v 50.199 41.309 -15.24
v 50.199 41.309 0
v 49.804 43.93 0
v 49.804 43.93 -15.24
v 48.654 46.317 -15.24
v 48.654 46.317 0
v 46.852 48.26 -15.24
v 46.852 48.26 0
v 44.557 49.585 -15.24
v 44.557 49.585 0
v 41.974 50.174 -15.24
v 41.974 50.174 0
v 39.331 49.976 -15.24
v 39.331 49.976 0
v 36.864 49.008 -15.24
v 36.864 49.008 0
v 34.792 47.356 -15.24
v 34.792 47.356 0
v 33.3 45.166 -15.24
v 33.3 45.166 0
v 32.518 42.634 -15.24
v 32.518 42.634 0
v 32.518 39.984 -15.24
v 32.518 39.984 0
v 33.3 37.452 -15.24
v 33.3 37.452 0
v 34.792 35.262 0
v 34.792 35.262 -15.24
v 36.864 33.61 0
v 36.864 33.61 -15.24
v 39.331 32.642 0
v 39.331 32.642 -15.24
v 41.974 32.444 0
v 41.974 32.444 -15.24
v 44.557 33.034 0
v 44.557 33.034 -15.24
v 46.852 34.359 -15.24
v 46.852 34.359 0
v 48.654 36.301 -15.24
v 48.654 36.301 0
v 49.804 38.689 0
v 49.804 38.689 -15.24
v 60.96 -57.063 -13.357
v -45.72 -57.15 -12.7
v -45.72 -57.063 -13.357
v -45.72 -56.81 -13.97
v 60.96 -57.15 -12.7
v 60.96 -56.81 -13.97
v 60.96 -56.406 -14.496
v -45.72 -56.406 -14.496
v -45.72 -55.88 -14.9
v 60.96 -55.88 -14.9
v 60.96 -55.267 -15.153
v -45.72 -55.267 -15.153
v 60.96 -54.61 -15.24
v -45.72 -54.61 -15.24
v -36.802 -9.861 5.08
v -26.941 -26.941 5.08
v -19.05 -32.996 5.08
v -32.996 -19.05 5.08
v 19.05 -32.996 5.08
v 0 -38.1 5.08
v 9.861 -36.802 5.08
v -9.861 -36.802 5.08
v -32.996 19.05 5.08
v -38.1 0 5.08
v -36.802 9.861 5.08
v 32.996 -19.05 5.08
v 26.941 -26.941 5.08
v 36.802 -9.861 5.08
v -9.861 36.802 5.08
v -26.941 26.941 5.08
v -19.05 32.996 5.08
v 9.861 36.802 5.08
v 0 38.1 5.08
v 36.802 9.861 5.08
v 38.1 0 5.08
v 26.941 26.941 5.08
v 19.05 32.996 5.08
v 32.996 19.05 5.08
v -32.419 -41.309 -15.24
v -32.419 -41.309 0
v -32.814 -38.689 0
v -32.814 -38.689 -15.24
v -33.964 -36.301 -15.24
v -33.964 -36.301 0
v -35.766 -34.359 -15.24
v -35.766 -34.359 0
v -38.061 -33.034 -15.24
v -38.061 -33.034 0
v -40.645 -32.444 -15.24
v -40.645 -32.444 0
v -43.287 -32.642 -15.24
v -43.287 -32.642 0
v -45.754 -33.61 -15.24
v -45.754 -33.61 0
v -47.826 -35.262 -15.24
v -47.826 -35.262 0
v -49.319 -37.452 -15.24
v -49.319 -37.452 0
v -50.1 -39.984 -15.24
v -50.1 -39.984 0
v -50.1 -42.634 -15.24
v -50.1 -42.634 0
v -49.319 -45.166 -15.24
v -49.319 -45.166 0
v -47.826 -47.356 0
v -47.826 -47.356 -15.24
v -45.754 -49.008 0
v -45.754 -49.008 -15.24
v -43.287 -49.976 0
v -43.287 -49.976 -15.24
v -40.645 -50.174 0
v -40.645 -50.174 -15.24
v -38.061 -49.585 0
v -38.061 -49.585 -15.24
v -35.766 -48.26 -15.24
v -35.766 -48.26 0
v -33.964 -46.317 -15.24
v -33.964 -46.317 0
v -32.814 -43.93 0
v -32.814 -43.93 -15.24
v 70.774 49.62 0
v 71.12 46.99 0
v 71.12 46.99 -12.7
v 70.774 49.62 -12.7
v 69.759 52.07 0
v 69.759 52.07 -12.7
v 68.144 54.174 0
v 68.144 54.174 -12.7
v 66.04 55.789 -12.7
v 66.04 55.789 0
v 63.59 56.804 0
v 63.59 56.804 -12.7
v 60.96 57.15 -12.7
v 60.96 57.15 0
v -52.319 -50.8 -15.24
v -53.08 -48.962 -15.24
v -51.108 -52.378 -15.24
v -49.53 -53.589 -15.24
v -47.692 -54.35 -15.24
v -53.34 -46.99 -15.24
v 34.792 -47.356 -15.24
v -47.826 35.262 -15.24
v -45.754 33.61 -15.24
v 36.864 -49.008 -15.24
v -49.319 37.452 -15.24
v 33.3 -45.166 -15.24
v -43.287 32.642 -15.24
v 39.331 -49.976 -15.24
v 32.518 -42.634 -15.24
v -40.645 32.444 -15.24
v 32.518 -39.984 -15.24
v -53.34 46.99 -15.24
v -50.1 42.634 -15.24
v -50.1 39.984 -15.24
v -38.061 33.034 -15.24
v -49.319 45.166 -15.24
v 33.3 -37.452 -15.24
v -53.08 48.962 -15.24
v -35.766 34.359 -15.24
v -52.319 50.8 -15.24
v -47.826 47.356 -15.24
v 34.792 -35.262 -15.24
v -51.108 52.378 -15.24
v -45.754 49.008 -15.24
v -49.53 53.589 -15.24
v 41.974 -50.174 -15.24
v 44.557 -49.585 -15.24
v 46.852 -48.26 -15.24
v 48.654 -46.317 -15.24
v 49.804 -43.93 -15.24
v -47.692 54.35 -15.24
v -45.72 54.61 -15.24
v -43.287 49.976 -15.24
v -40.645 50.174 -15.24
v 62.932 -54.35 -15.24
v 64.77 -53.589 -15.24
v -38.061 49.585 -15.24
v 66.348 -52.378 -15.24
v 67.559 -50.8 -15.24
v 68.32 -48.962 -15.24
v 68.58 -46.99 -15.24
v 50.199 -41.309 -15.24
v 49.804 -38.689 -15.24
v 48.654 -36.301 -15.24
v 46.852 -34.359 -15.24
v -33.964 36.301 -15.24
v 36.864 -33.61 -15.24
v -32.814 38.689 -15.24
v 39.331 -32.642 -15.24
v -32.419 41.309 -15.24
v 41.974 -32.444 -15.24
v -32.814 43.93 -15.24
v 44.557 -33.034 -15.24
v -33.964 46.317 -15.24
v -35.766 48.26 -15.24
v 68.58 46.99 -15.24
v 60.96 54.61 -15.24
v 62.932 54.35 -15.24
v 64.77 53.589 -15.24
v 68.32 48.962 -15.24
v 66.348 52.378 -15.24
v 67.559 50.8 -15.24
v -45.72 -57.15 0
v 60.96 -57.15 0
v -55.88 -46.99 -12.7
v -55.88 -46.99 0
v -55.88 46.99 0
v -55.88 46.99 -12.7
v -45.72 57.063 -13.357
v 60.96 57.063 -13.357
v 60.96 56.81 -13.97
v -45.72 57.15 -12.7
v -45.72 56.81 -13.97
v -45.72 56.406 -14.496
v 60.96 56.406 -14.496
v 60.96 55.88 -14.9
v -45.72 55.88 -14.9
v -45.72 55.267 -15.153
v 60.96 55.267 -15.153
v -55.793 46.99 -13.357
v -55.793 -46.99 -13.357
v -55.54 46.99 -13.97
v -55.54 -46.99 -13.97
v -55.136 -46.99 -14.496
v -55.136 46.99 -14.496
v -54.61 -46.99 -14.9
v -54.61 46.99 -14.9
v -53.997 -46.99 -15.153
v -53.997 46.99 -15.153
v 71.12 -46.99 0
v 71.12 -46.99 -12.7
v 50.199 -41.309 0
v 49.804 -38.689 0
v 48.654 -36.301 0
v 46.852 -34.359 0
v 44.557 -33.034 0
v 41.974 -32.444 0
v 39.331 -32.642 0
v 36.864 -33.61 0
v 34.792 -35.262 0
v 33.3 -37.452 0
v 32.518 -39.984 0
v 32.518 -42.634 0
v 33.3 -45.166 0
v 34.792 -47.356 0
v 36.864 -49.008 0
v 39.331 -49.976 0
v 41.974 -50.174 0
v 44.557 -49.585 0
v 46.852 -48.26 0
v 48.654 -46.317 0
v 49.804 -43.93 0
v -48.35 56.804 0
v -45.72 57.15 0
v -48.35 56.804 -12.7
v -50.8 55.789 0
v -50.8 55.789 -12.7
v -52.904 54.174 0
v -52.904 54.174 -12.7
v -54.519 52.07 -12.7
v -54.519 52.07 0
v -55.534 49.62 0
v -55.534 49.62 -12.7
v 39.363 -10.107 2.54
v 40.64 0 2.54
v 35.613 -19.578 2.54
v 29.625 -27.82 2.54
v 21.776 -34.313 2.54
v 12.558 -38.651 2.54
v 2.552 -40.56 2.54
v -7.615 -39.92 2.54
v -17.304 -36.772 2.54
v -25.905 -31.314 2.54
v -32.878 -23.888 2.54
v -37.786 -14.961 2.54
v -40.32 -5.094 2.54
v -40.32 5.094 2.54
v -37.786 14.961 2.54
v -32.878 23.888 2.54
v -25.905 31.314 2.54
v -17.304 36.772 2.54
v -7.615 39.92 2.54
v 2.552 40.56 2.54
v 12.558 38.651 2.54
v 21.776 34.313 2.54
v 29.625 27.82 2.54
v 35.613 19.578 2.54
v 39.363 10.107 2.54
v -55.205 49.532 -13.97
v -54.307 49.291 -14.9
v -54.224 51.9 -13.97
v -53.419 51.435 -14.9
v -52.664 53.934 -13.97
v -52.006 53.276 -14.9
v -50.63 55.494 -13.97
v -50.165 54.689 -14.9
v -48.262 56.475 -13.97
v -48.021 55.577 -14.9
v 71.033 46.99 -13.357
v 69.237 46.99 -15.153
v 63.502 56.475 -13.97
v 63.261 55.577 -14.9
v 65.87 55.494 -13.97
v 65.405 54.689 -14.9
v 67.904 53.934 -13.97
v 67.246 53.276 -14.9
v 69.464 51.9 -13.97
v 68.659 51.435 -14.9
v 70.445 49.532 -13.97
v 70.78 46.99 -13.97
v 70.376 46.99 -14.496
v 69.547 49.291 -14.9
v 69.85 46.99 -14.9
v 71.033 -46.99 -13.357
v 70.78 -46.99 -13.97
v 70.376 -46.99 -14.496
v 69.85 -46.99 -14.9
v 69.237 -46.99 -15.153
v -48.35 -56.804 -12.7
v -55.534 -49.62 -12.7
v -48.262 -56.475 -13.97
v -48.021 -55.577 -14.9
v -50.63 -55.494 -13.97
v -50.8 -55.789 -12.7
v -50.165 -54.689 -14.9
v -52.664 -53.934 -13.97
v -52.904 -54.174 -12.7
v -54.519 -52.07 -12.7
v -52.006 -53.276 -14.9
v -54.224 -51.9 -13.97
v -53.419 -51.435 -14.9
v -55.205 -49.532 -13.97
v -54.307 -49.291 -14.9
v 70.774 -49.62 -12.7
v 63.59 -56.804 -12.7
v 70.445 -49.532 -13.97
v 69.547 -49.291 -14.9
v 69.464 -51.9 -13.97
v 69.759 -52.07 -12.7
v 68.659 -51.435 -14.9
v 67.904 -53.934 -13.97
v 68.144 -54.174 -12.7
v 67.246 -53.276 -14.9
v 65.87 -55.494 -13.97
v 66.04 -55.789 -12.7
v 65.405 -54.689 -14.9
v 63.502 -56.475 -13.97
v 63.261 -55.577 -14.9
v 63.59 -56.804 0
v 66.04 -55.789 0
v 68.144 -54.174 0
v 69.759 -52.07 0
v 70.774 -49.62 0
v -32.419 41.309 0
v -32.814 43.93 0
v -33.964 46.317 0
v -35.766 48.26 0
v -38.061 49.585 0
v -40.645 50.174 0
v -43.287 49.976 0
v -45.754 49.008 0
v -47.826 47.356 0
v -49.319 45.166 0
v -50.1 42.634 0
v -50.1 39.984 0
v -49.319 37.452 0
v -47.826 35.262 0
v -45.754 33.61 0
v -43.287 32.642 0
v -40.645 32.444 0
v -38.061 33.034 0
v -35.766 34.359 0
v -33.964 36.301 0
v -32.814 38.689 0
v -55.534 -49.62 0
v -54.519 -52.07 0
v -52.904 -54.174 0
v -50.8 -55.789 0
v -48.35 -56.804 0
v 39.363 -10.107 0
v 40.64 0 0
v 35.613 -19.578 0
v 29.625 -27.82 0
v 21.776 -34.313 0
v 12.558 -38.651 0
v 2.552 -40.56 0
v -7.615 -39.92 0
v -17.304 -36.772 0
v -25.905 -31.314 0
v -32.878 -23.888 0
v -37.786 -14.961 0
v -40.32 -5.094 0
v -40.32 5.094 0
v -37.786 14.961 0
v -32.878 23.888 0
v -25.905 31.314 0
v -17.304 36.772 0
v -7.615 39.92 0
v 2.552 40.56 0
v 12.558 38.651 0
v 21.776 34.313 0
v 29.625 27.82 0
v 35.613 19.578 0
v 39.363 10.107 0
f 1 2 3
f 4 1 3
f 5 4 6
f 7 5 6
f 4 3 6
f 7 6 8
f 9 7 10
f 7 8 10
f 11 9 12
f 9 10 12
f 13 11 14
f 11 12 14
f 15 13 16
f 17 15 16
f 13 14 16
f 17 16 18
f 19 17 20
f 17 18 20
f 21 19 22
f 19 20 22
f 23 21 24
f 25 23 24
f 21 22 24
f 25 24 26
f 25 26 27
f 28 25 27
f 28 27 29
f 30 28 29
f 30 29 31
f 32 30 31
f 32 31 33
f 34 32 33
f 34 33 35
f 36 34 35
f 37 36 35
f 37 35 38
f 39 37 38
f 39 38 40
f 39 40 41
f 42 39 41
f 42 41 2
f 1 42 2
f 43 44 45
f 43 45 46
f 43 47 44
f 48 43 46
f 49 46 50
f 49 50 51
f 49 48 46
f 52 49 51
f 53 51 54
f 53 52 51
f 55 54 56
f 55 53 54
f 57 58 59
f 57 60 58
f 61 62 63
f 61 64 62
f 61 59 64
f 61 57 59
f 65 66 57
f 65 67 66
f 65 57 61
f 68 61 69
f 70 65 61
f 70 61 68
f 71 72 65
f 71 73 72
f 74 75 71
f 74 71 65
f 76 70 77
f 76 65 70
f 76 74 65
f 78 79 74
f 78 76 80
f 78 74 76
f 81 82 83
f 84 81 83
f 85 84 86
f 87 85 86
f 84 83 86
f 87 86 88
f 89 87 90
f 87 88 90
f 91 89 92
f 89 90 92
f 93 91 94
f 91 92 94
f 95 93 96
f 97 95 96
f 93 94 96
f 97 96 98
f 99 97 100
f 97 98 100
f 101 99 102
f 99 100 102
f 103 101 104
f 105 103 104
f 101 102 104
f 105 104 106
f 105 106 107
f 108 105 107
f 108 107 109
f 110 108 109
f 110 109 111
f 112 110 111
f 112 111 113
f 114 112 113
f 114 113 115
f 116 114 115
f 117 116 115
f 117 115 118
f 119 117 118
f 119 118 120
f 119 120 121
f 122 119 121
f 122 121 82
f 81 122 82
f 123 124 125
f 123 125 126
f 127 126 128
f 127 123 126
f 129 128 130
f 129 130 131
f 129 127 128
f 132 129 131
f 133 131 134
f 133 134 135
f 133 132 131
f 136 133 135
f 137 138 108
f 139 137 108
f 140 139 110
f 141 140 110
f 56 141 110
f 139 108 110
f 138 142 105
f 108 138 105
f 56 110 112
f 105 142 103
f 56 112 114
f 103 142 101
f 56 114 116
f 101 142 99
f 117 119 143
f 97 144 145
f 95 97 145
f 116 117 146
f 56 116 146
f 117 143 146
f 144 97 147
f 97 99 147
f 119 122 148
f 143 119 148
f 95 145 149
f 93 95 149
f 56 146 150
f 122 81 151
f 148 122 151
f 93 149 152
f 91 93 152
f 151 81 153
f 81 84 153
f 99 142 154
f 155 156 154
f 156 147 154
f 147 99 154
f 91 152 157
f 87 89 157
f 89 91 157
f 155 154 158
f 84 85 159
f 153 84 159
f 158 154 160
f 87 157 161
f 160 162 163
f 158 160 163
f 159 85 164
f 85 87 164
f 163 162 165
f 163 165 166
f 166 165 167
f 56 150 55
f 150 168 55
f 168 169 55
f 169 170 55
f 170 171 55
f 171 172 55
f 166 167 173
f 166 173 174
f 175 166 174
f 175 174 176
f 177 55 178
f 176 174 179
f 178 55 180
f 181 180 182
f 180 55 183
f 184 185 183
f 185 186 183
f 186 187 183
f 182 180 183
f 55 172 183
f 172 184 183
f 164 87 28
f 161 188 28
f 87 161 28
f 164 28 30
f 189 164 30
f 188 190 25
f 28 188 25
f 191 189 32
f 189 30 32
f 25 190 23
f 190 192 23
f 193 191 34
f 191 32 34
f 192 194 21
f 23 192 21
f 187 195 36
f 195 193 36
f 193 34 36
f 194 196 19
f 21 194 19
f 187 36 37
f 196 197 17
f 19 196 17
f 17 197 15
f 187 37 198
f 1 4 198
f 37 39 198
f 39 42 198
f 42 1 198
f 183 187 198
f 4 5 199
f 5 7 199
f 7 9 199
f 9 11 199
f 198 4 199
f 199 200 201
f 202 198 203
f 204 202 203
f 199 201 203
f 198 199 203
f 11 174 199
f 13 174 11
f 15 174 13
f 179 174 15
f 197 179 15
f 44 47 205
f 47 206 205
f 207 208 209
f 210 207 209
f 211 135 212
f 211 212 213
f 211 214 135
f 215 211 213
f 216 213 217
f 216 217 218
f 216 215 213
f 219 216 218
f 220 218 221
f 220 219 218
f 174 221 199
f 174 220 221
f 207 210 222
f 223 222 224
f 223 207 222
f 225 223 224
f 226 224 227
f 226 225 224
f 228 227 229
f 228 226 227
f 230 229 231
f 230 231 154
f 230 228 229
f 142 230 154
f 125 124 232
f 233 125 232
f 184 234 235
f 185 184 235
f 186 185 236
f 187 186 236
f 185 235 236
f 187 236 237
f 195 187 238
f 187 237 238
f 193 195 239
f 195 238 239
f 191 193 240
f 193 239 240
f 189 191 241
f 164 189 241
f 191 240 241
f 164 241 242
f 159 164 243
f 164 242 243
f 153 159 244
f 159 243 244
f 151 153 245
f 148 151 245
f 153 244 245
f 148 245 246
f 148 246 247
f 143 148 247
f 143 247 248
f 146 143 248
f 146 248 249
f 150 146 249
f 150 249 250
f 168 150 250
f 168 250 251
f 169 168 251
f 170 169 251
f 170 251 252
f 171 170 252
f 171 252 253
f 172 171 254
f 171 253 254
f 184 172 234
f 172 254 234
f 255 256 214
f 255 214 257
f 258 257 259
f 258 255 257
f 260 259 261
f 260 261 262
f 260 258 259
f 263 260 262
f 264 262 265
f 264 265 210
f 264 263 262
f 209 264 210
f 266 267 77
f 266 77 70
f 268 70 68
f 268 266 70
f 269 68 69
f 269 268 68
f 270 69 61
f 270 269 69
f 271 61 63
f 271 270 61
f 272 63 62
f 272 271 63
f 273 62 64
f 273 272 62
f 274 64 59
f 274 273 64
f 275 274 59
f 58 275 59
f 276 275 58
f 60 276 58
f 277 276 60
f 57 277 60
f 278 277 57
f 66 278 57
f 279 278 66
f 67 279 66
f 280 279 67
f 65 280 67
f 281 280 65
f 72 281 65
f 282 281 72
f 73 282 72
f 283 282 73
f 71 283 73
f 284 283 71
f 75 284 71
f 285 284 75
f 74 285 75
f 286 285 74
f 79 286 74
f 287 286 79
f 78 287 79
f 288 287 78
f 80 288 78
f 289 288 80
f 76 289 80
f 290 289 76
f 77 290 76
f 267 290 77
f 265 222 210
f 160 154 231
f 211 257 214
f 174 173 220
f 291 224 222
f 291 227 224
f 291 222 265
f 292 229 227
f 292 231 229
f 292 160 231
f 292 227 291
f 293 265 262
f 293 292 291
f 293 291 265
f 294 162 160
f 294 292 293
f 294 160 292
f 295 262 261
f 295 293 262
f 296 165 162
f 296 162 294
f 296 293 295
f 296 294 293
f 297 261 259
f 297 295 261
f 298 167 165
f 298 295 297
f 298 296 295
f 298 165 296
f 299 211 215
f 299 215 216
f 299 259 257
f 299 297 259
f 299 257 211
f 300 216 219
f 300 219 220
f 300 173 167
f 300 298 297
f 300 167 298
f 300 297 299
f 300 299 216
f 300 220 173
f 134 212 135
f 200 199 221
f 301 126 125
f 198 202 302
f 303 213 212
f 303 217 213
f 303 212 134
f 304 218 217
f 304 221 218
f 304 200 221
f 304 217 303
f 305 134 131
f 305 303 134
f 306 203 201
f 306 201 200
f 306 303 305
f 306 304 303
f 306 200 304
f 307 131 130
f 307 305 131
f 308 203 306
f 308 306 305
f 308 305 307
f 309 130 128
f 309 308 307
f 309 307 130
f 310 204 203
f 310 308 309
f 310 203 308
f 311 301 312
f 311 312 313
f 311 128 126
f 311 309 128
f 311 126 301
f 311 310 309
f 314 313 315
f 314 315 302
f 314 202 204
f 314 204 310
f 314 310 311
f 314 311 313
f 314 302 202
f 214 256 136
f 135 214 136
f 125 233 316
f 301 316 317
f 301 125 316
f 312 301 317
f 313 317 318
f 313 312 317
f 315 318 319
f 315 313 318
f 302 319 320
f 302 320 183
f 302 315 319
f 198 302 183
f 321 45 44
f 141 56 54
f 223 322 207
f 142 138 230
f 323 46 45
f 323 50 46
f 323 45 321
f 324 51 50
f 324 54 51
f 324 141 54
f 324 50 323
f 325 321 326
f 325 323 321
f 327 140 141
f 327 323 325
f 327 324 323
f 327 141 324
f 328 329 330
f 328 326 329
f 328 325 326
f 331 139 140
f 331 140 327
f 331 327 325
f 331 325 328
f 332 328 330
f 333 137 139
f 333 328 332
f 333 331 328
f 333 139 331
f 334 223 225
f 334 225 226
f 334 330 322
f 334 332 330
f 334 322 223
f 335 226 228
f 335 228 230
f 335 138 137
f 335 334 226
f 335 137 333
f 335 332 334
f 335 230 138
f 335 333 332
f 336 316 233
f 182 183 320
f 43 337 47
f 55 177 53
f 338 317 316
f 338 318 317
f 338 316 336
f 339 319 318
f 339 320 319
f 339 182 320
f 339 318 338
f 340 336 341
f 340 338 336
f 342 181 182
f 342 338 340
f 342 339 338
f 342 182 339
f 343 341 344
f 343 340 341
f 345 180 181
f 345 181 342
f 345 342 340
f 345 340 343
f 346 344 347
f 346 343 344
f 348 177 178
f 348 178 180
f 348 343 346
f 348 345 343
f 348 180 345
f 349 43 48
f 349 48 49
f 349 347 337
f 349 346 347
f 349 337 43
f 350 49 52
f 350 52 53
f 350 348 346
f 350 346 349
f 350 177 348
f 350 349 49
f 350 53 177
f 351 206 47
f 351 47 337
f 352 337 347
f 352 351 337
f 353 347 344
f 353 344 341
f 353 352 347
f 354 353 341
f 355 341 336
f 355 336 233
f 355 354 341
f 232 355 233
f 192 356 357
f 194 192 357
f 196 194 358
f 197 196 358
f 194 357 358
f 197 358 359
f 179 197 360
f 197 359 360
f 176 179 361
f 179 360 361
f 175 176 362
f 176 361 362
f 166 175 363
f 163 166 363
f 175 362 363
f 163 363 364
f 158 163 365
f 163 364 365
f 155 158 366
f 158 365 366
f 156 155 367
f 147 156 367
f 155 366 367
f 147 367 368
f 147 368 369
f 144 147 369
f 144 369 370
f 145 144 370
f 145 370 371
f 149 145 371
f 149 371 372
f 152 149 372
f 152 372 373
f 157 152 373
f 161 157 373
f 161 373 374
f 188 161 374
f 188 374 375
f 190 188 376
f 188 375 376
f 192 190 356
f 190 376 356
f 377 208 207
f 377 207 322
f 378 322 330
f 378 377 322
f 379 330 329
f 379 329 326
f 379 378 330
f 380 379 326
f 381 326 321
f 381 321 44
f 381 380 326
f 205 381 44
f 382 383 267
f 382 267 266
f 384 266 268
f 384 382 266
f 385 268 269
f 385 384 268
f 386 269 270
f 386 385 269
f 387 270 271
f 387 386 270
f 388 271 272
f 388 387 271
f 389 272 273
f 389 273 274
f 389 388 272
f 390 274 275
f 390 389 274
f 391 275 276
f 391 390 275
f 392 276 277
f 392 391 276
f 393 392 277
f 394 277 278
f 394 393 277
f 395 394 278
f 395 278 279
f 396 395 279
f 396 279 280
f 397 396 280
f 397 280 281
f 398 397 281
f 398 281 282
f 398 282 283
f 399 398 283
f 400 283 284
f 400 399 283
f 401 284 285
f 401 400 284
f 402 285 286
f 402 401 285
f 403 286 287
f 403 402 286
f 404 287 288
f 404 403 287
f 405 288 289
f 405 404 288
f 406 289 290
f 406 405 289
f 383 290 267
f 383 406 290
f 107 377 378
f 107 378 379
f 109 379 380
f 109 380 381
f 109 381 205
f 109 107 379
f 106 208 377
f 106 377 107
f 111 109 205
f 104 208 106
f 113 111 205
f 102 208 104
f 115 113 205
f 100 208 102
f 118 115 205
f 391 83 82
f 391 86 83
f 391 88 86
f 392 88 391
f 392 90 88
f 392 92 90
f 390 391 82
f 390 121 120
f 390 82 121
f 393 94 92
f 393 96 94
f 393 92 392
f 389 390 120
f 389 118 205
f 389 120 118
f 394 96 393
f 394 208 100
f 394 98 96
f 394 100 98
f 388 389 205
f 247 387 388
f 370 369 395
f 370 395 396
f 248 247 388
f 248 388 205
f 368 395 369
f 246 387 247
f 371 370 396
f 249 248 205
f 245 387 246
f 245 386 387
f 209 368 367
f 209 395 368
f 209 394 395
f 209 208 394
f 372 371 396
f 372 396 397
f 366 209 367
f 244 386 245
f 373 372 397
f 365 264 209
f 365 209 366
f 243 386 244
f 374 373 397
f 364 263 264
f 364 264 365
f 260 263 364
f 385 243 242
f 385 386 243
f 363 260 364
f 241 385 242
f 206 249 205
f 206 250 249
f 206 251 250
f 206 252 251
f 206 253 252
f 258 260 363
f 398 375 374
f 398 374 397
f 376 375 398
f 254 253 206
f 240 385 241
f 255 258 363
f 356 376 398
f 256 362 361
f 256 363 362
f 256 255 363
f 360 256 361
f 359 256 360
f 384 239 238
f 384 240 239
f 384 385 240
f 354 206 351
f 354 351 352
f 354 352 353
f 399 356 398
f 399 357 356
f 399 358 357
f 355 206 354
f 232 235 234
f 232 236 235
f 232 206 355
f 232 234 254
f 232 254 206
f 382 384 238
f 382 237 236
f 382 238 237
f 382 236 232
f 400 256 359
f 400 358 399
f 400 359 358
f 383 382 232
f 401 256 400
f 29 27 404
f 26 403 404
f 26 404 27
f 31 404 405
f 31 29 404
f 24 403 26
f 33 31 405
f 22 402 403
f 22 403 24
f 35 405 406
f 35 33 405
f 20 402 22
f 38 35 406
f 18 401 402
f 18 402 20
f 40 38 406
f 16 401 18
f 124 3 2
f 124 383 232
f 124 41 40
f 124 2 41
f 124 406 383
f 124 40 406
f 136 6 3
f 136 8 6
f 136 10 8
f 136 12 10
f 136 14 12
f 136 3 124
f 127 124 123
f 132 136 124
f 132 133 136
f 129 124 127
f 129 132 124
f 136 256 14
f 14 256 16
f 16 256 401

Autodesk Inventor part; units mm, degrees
ref_plane "YZ Plane" through (0, 0, 0) normal (1, 0, 0) x (0, 1, 0)
ref_plane "XZ Plane" through (0, 0, 0) normal (0, 1, 0) x (-1, 0, 0)
ref_plane "XY Plane" through (0, 0, 0) normal (0, 0, 1) x (1, 0, 0)
sketch "Sketch1" plane through (0, 0, 0) normal (0, 0, 1) x (1, 0, 0)
  line L0 (-45.72, 57.15) -> (60.96, 57.15)
  line L1 (71.12, 46.99) -> (71.12, -46.99)
  line L2 (60.96, -57.15) -> (-45.72, -57.15)
  line L3 (-55.88, -46.99) -> (-55.88, 46.99)
  line L4 (-85.7425, 0) -> (99.7187, 0) projected
  line L5 (0, -82.9559) -> (0, 82.9559) projected
  circle A0 centre (0, 0) radius 40.64
  circle A1 centre (0, 0) radius 58.42 construction
  line L6 (0, 0) -> (-59.2481, 59.2481) construction
  circle A2 centre (-41.3092, 41.3092) radius 8.89
  circle A3 centre (-41.3092, -41.3092) radius 8.89
  circle A4 centre (41.3092, -41.3092) radius 8.89
  circle A5 centre (41.3092, 41.3092) radius 8.89
  arc A6 (-45.72, 57.15) -> (-55.88, 46.99) centre (-45.72, 46.99) ccw
  arc A7 (71.12, 46.99) -> (60.96, 57.15) centre (60.96, 46.99) ccw
  arc A8 (60.96, -57.15) -> (71.12, -46.99) centre (60.96, -46.99) ccw
  arc A9 (-55.88, -46.99) -> (-45.72, -57.15) centre (-45.72, -46.99) ccw
  point P0 (71.12, -57.15)
  point P1 (71.12, 57.15)
  point P2 (-55.88, -57.15)
  point P3 (71.12, 0)
  dimension "d4" = 116.84
  dimension "d0" = 127
  dimension "d1" = 114.3
  dimension "d2" = 55.88
  dimension "d3" = 81.28
  dimension "d5" = 45
  dimension "d6" = 17.78
  dimension "d9" = 360
  dimension "d11" = 10.16
  dimension "d12" = 59.2481
extrude "Extrusion1" add sketch "Sketch1" against normal blind 15.24
extrude "Extrusion2" add sketch "Sketch1" along normal blind 5.08 contours A0 L4 L5 | L5 L4 A0 | L5 A0 L4 | L4 A0 L5
chamfer "Chamfer1" distance 2.54 angle 45 1 edges at (-40.64, 0, 5.08) measured on face at (4.2922, -0.5549, 5.08)
fillet "Fillet1" radius 2.54 8 edges at (68.1442, 54.1742, -15.24) (71.12, 0, -15.24) (68.1442, -54.1742, -15.24) (7.62, -57.15, -15.24) (-52.9042, -54.1742, -15.24) (-55.88, 0, -15.24) (-52.9042, 54.1742, -15.24) (7.62, 57.15, -15.24)
equation "\"BendRadius\" = Thickness"
equation "\"BendReliefWidth\" = Thickness"
equation "\"BendReliefDepth\" = 0.5 * Thickness"
equation "\"CornerReliefSize\" = 4 * Thickness"
equation "\"MinimumRemnant\" = 2 * Thickness"
equation "\"TransitionRadius\" = BendRadius"
equation "\"JacobiRadiusSize\" = BendRadius"
equation "\"GapSize\" = Thickness"
equation "\"Thickness\" = 3.048"
properties part number "cylinder head" material "Aluminum 6061"
